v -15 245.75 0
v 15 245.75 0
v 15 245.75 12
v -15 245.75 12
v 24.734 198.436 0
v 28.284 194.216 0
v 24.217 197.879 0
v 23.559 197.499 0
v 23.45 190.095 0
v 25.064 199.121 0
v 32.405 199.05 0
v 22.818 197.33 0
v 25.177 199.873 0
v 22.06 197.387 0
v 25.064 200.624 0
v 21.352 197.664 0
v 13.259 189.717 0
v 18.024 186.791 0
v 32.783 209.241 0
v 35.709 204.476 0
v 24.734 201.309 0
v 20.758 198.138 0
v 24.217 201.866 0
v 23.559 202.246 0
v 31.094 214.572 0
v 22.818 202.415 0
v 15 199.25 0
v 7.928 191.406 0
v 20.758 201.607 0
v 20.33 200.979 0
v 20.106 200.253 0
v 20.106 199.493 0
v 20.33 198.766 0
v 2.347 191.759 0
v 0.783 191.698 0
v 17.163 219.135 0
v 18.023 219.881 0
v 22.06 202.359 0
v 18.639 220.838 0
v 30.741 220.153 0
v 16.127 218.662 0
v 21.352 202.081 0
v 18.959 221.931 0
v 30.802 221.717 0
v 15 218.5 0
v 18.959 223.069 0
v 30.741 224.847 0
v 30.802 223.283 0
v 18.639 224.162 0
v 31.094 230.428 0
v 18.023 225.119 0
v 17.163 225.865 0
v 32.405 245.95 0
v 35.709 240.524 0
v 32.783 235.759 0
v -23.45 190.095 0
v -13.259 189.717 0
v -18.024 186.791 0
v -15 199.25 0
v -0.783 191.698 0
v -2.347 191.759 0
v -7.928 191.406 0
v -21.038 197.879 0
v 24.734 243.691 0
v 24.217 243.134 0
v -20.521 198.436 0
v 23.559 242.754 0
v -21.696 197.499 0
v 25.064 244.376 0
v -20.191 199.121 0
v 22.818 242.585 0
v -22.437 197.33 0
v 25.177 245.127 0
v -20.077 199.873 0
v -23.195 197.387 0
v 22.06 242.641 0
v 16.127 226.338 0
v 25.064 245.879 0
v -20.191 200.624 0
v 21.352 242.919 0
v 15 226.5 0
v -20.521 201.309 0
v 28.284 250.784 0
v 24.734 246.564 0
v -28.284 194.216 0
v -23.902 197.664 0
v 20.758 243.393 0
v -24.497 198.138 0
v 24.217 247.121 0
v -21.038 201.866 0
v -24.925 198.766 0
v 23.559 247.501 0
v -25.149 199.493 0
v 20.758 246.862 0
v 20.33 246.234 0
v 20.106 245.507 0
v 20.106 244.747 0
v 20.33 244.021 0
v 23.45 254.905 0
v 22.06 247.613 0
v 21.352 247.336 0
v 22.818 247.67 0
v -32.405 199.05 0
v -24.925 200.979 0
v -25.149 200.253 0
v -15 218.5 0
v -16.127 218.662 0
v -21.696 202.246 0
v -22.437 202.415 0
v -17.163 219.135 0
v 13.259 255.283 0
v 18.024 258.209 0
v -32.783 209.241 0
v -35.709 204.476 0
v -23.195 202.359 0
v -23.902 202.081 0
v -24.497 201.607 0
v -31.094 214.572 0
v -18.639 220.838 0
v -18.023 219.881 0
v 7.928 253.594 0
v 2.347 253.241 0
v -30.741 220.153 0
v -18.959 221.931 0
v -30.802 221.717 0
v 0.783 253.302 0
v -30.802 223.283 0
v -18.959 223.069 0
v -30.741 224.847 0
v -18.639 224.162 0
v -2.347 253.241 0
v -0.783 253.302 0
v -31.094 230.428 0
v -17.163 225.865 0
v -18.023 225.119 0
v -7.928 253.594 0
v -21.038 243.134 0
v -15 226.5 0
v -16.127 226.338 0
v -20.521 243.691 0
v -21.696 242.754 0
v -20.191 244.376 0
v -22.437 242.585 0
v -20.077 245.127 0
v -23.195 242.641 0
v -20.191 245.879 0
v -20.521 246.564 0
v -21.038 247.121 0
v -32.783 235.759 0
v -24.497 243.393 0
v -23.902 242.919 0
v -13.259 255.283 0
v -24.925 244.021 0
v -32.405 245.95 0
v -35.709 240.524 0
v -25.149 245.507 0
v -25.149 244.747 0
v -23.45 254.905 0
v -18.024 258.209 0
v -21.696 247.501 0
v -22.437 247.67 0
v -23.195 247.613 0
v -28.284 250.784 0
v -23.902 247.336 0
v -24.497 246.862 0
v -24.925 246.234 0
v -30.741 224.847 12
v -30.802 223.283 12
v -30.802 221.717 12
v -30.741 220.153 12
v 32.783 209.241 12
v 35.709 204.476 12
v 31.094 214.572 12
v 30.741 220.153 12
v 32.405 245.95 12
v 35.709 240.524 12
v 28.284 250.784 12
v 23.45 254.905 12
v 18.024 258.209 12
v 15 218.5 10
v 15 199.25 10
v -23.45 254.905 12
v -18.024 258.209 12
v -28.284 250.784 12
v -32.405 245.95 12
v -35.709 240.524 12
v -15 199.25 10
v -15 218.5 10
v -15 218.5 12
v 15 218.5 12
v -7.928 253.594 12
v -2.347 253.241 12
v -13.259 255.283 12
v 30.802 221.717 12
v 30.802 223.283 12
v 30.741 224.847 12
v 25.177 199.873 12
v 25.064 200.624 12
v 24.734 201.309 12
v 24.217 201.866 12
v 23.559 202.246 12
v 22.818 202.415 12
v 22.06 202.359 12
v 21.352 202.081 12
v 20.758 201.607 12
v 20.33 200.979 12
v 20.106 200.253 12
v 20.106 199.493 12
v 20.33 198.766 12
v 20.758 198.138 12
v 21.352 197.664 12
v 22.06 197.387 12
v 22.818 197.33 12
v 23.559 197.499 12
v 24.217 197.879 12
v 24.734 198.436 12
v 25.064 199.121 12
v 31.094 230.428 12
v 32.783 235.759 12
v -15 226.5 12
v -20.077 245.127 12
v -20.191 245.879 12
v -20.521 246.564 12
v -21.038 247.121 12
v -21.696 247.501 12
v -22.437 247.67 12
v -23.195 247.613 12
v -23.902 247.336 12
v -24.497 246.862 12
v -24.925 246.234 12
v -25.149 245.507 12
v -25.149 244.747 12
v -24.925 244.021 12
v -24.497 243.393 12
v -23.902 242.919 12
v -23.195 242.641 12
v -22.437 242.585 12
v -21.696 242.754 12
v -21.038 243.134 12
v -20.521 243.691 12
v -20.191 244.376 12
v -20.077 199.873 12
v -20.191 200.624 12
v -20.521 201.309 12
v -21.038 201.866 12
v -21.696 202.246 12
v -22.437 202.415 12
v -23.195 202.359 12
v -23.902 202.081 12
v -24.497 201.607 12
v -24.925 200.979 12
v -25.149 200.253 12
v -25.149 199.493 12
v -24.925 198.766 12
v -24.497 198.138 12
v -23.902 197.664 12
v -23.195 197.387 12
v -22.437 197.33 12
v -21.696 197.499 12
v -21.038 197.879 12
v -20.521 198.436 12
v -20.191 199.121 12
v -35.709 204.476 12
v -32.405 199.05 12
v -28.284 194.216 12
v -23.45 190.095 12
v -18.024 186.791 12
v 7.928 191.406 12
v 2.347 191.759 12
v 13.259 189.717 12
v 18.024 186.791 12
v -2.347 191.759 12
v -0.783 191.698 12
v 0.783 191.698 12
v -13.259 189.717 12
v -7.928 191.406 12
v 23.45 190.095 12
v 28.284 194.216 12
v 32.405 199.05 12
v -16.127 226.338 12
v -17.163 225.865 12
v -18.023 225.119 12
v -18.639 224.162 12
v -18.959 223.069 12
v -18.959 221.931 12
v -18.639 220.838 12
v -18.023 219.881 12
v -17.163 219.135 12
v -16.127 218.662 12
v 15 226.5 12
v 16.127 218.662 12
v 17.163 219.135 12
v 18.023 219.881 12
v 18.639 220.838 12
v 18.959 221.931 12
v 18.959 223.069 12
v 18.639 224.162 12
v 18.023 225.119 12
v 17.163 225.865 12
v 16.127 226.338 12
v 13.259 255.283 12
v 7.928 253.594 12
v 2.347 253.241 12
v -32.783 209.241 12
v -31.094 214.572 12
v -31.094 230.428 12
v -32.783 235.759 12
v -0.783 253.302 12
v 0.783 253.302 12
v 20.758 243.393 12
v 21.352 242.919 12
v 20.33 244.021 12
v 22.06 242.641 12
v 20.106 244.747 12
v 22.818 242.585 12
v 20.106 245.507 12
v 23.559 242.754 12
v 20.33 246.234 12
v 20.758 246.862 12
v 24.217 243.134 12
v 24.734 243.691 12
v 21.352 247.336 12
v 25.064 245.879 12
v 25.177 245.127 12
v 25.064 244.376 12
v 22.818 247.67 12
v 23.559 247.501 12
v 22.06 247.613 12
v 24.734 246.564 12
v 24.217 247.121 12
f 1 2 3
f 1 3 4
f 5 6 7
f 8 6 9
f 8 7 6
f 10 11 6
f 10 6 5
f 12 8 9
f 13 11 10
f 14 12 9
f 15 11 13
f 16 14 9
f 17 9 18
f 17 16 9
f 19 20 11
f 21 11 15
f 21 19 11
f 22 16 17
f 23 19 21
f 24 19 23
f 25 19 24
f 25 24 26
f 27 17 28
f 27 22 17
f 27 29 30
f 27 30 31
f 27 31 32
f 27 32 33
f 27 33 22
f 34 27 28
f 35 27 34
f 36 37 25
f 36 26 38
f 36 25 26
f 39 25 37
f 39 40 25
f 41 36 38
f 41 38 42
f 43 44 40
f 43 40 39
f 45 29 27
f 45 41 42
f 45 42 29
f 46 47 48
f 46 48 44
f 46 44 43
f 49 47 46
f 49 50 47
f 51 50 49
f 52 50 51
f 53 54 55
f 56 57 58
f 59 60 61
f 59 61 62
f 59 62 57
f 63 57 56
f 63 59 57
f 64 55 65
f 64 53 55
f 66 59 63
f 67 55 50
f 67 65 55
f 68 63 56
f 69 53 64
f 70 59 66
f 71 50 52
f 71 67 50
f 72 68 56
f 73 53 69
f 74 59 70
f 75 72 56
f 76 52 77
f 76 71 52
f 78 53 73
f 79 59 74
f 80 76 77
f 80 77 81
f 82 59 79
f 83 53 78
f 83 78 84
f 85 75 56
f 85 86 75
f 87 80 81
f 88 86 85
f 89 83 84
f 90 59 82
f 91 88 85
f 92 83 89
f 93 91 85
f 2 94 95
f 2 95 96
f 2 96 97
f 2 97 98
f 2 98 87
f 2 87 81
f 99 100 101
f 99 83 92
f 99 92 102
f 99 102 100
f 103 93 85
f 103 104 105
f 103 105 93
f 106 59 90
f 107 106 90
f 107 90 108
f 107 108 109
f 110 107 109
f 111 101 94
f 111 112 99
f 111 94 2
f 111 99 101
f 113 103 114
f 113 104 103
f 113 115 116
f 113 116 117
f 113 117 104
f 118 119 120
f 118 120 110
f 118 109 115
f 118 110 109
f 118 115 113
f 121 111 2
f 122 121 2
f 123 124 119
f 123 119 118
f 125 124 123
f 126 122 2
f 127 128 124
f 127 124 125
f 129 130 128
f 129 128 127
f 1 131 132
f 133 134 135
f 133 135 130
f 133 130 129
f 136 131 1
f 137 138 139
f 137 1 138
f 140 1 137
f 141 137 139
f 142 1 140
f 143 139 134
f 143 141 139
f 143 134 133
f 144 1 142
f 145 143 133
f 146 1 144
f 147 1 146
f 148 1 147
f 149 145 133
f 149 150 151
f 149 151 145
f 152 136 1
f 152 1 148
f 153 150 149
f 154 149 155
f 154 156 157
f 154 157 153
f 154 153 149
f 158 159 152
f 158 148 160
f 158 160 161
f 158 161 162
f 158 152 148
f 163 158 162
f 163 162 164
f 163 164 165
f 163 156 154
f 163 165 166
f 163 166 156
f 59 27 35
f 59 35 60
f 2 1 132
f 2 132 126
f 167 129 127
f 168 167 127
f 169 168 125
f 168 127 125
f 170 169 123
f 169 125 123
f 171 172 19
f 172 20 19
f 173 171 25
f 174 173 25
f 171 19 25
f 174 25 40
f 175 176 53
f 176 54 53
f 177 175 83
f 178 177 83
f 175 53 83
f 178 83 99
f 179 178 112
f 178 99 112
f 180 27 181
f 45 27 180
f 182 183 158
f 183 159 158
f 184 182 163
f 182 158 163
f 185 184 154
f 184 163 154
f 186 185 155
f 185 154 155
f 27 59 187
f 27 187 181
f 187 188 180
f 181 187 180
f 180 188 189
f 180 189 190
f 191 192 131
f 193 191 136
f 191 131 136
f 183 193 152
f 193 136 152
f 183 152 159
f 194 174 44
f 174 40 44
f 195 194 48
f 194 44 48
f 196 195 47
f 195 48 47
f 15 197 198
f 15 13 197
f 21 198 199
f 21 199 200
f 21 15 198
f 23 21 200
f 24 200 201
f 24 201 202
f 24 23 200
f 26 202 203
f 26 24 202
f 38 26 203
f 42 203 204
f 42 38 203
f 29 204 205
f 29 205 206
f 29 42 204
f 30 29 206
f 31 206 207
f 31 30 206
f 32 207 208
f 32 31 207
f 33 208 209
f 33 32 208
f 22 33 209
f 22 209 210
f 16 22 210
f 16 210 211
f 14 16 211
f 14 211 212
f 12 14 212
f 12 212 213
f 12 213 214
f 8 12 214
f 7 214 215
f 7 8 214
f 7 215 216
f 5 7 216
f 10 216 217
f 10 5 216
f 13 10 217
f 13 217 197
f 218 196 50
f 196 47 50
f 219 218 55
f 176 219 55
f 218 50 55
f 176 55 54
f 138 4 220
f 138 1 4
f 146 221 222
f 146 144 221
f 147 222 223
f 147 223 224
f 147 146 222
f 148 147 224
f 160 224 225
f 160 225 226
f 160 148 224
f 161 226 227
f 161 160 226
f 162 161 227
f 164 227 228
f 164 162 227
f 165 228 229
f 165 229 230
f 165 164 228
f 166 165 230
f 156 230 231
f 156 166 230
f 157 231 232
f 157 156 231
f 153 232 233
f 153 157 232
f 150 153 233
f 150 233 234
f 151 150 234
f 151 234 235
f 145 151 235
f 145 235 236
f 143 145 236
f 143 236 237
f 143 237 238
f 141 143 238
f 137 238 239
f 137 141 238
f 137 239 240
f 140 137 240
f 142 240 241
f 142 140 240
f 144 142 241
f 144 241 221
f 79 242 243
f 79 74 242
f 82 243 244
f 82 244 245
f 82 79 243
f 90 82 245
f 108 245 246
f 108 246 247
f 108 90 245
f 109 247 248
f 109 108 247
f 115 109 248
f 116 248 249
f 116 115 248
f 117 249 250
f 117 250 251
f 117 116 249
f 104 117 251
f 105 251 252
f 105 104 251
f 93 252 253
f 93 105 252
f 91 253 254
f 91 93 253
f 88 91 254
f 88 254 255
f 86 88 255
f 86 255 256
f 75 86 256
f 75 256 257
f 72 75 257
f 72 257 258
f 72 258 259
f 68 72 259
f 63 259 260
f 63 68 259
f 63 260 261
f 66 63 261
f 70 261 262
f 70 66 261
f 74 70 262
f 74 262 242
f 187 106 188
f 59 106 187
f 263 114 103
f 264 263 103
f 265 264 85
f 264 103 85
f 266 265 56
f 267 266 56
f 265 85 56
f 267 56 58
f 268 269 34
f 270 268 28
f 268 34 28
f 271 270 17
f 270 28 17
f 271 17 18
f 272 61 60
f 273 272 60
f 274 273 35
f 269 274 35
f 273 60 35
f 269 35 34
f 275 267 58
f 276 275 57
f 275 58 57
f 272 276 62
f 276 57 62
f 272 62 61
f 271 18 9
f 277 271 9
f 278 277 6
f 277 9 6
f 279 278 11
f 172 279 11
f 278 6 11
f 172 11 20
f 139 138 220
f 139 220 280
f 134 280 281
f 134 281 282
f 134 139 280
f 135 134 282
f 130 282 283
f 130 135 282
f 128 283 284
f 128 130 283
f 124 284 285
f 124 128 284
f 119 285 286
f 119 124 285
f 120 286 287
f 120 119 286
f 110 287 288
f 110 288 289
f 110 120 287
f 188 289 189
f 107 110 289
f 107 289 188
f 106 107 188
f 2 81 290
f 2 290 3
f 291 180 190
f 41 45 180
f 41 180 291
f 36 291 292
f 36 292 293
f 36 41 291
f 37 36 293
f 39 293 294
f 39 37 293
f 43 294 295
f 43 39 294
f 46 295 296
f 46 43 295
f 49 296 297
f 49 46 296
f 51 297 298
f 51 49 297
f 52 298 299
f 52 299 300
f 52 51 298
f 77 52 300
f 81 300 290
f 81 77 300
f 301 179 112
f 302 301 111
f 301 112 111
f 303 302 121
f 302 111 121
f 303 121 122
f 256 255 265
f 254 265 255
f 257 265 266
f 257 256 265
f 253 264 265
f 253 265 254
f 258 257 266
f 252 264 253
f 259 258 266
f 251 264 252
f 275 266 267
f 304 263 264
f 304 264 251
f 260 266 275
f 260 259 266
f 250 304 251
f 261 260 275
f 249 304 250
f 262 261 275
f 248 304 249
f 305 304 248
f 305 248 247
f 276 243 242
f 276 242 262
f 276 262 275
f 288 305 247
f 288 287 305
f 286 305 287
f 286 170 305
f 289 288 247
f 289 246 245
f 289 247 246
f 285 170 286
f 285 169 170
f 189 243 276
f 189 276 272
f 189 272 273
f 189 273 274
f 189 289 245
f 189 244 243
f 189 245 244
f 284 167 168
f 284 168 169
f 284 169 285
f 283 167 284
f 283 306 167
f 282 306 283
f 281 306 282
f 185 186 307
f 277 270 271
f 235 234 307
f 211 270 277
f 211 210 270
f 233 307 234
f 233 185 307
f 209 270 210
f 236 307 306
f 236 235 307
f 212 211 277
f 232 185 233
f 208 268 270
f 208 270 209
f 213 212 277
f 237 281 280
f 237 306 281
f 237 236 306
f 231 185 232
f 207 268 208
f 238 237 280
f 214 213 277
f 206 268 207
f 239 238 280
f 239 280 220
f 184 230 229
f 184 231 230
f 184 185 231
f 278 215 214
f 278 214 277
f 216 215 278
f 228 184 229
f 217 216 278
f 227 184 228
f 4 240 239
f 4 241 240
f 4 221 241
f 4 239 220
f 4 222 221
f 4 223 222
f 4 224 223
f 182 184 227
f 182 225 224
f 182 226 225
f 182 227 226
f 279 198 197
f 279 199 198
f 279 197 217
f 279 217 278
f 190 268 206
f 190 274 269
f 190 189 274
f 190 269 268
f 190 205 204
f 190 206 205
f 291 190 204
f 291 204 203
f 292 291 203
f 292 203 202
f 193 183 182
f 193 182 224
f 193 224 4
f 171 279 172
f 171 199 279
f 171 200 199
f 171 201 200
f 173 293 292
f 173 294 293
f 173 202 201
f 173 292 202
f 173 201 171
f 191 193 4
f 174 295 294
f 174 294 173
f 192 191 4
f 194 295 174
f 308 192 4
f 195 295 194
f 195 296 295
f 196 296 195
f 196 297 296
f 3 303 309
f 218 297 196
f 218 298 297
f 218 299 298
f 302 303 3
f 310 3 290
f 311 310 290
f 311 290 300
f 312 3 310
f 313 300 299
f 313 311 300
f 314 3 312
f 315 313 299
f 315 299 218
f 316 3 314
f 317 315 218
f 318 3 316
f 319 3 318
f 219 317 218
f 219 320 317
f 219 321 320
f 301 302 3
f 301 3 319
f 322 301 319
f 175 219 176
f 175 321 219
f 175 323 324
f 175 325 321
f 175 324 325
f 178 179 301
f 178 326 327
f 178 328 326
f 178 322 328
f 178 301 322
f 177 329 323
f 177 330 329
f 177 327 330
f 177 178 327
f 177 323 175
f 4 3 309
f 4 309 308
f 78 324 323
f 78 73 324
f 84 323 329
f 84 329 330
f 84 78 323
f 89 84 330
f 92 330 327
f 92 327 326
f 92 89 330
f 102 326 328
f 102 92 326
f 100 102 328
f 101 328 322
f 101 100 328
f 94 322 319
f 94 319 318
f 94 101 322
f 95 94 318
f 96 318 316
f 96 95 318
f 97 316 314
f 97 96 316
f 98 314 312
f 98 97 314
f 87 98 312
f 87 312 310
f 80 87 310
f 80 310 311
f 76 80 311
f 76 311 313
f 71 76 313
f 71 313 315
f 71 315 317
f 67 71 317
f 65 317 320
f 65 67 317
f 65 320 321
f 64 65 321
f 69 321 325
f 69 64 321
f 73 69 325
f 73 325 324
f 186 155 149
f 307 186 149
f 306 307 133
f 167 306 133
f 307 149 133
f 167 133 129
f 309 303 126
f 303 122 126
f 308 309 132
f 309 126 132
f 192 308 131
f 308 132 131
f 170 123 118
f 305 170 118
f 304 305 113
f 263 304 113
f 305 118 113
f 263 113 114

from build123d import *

# Parameters (mm, degrees)
SKETCH1_R           = 2.55
BOSS_EXTRUDE2_DEPTH = 10
SKETCH2_R           = 2.55
BOSS_EXTRUDE3_DEPTH = 2


with BuildPart() as part:
    # Sketch1 → Boss-Extrude2 (new body)
    with BuildSketch(Plane.XY):
        with BuildLine():
            ThreePointArc((18.024150889, 186.79103775), (10.644862344, 190.724335457), (2.347067513, 191.759386777))
            ThreePointArc((2.347067513, 191.759386777), (0, 191.690468331), (-2.347067513, 191.759386777))
            ThreePointArc((-2.347067513, 191.759386777), (-10.644862344, 190.724335457), (-18.024150889, 186.79103775))
            ThreePointArc((-18.024150889, 186.79103775), (-28.284271247, 194.215728749), (-35.708962247, 204.475849108))
            ThreePointArc((-35.708962247, 204.475849108), (-31.77566454, 211.855137653), (-30.74061322, 220.152932484))
            ThreePointArc((-30.74061322, 220.152932484), (-30.809531665, 222.499999997), (-30.74061322, 224.84706751))
            ThreePointArc((-30.74061322, 224.84706751), (-31.77566454, 233.14486234), (-35.708962247, 240.524150885))
            ThreePointArc((-35.708962247, 240.524150885), (-28.284271247, 250.784271244), (-18.024150889, 258.208962244))
            ThreePointArc((-18.024150889, 258.208962244), (-10.644862344, 254.275664537), (-2.347067513, 253.240613217))
            ThreePointArc((-2.347067513, 253.240613217), (0, 253.309531662), (2.347067513, 253.240613217))
            ThreePointArc((2.347067513, 253.240613217), (10.644862344, 254.275664537), (18.024150889, 258.208962244))
            ThreePointArc((18.024150889, 258.208962244), (28.284271247, 250.784271244), (35.708962247, 240.524150885))
            ThreePointArc((35.708962247, 240.524150885), (31.77566454, 233.14486234), (30.74061322, 224.84706751))
            ThreePointArc((30.74061322, 224.84706751), (30.809531665, 222.499999997), (30.74061322, 220.152932484))
            ThreePointArc((30.74061322, 220.152932484), (31.77566454, 211.855137653), (35.708962247, 204.475849108))
            ThreePointArc((35.708962247, 204.475849108), (28.284271247, 194.215728749), (18.024150889, 186.79103775))
        make_face()
        with Locations((-22.627416998, 245.127416995)):
            Circle(SKETCH1_R, mode=Mode.SUBTRACT)
        with Locations((-22.627416998, 199.872582999)):
            Circle(SKETCH1_R, mode=Mode.SUBTRACT)
        with Locations((22.627416998, 199.872582999)):
            Circle(SKETCH1_R, mode=Mode.SUBTRACT)
        with Locations((22.627416998, 245.127416995)):
            Circle(SKETCH1_R, mode=Mode.SUBTRACT)
        with BuildLine():
            Line((-15, 218.499999997), (-15, 199.25))
            Line((-15, 199.25), (15, 199.25))
            Line((15, 199.25), (15, 218.499999997))
            ThreePointArc((15, 218.499999997), (19, 222.499999997), (15, 226.499999997))
            Line((15, 226.499999997), (15, 245.749999994))
            Line((15, 245.749999994), (-15, 245.749999994))
            Line((-15, 245.749999994), (-15, 226.499999997))
            ThreePointArc((-15, 226.499999997), (-19, 222.499999997), (-15, 218.499999997))
        make_face(mode=Mode.SUBTRACT)
    extrude(amount=BOSS_EXTRUDE2_DEPTH)

    # Sketch2 → Boss-Extrude3 (add)
    with BuildSketch(Plane.XY.offset(10)):
        with BuildLine():
            ThreePointArc((18.024150889, 186.79103775), (28.284271247, 194.215728749), (35.708962247, 204.475849108))
            ThreePointArc((35.708962247, 204.475849108), (31.77566454, 211.855137653), (30.74061322, 220.152932484))
            ThreePointArc((30.74061322, 220.152932484), (30.809531665, 222.499999997), (30.74061322, 224.84706751))
            ThreePointArc((30.74061322, 224.84706751), (31.77566454, 233.14486234), (35.708962247, 240.524150885))
            ThreePointArc((35.708962247, 240.524150885), (28.284271247, 250.784271244), (18.024150889, 258.208962244))
            ThreePointArc((18.024150889, 258.208962244), (10.644862344, 254.275664537), (2.347067513, 253.240613217))
            ThreePointArc((2.347067513, 253.240613217), (0, 253.309531662), (-2.347067513, 253.240613217))
            ThreePointArc((-2.347067513, 253.240613217), (-10.644862344, 254.275664537), (-18.024150889, 258.208962244))
            ThreePointArc((-18.024150889, 258.208962244), (-28.284271247, 250.784271244), (-35.708962247, 240.524150885))
            ThreePointArc((-35.708962247, 240.524150885), (-31.77566454, 233.14486234), (-30.74061322, 224.84706751))
            ThreePointArc((-30.74061322, 224.84706751), (-30.809531665, 222.499999997), (-30.74061322, 220.152932484))
            ThreePointArc((-30.74061322, 220.152932484), (-31.77566454, 211.855137653), (-35.708962247, 204.475849108))
            ThreePointArc((-35.708962247, 204.475849108), (-28.284271247, 194.215728749), (-18.024150889, 186.79103775))
            ThreePointArc((-18.024150889, 186.79103775), (-10.644862344, 190.724335457), (-2.347067513, 191.759386777))
            ThreePointArc((-2.347067513, 191.759386777), (0, 191.690468331), (2.347067513, 191.759386777))
            ThreePointArc((2.347067513, 191.759386777), (10.644862344, 190.724335457), (18.024150889, 186.79103775))
        make_face()
        with Locations((-22.627416998, 245.127416995)):
            Circle(SKETCH2_R, mode=Mode.SUBTRACT)
        with Locations((-22.627416998, 199.872582999)):
            Circle(SKETCH2_R, mode=Mode.SUBTRACT)
        with Locations((22.627416998, 199.872582999)):
            Circle(SKETCH2_R, mode=Mode.SUBTRACT)
        with Locations((22.627416998, 245.127416995)):
            Circle(SKETCH2_R, mode=Mode.SUBTRACT)
        with BuildLine():
            Line((-15, 245.749999994), (-15, 226.499999997))
            ThreePointArc((-15, 226.499999997), (-19, 222.499999997), (-15, 218.499999997))
            Line((-15, 218.499999997), (15, 218.499999997))
            ThreePointArc((15, 218.499999997), (19, 222.499999997), (15, 226.499999997))
            Line((15, 226.499999997), (15, 245.749999994))
            Line((15, 245.749999994), (-15, 245.749999994))
        make_face(mode=Mode.SUBTRACT)
    extrude(amount=BOSS_EXTRUDE3_DEPTH)


solid = part.part
